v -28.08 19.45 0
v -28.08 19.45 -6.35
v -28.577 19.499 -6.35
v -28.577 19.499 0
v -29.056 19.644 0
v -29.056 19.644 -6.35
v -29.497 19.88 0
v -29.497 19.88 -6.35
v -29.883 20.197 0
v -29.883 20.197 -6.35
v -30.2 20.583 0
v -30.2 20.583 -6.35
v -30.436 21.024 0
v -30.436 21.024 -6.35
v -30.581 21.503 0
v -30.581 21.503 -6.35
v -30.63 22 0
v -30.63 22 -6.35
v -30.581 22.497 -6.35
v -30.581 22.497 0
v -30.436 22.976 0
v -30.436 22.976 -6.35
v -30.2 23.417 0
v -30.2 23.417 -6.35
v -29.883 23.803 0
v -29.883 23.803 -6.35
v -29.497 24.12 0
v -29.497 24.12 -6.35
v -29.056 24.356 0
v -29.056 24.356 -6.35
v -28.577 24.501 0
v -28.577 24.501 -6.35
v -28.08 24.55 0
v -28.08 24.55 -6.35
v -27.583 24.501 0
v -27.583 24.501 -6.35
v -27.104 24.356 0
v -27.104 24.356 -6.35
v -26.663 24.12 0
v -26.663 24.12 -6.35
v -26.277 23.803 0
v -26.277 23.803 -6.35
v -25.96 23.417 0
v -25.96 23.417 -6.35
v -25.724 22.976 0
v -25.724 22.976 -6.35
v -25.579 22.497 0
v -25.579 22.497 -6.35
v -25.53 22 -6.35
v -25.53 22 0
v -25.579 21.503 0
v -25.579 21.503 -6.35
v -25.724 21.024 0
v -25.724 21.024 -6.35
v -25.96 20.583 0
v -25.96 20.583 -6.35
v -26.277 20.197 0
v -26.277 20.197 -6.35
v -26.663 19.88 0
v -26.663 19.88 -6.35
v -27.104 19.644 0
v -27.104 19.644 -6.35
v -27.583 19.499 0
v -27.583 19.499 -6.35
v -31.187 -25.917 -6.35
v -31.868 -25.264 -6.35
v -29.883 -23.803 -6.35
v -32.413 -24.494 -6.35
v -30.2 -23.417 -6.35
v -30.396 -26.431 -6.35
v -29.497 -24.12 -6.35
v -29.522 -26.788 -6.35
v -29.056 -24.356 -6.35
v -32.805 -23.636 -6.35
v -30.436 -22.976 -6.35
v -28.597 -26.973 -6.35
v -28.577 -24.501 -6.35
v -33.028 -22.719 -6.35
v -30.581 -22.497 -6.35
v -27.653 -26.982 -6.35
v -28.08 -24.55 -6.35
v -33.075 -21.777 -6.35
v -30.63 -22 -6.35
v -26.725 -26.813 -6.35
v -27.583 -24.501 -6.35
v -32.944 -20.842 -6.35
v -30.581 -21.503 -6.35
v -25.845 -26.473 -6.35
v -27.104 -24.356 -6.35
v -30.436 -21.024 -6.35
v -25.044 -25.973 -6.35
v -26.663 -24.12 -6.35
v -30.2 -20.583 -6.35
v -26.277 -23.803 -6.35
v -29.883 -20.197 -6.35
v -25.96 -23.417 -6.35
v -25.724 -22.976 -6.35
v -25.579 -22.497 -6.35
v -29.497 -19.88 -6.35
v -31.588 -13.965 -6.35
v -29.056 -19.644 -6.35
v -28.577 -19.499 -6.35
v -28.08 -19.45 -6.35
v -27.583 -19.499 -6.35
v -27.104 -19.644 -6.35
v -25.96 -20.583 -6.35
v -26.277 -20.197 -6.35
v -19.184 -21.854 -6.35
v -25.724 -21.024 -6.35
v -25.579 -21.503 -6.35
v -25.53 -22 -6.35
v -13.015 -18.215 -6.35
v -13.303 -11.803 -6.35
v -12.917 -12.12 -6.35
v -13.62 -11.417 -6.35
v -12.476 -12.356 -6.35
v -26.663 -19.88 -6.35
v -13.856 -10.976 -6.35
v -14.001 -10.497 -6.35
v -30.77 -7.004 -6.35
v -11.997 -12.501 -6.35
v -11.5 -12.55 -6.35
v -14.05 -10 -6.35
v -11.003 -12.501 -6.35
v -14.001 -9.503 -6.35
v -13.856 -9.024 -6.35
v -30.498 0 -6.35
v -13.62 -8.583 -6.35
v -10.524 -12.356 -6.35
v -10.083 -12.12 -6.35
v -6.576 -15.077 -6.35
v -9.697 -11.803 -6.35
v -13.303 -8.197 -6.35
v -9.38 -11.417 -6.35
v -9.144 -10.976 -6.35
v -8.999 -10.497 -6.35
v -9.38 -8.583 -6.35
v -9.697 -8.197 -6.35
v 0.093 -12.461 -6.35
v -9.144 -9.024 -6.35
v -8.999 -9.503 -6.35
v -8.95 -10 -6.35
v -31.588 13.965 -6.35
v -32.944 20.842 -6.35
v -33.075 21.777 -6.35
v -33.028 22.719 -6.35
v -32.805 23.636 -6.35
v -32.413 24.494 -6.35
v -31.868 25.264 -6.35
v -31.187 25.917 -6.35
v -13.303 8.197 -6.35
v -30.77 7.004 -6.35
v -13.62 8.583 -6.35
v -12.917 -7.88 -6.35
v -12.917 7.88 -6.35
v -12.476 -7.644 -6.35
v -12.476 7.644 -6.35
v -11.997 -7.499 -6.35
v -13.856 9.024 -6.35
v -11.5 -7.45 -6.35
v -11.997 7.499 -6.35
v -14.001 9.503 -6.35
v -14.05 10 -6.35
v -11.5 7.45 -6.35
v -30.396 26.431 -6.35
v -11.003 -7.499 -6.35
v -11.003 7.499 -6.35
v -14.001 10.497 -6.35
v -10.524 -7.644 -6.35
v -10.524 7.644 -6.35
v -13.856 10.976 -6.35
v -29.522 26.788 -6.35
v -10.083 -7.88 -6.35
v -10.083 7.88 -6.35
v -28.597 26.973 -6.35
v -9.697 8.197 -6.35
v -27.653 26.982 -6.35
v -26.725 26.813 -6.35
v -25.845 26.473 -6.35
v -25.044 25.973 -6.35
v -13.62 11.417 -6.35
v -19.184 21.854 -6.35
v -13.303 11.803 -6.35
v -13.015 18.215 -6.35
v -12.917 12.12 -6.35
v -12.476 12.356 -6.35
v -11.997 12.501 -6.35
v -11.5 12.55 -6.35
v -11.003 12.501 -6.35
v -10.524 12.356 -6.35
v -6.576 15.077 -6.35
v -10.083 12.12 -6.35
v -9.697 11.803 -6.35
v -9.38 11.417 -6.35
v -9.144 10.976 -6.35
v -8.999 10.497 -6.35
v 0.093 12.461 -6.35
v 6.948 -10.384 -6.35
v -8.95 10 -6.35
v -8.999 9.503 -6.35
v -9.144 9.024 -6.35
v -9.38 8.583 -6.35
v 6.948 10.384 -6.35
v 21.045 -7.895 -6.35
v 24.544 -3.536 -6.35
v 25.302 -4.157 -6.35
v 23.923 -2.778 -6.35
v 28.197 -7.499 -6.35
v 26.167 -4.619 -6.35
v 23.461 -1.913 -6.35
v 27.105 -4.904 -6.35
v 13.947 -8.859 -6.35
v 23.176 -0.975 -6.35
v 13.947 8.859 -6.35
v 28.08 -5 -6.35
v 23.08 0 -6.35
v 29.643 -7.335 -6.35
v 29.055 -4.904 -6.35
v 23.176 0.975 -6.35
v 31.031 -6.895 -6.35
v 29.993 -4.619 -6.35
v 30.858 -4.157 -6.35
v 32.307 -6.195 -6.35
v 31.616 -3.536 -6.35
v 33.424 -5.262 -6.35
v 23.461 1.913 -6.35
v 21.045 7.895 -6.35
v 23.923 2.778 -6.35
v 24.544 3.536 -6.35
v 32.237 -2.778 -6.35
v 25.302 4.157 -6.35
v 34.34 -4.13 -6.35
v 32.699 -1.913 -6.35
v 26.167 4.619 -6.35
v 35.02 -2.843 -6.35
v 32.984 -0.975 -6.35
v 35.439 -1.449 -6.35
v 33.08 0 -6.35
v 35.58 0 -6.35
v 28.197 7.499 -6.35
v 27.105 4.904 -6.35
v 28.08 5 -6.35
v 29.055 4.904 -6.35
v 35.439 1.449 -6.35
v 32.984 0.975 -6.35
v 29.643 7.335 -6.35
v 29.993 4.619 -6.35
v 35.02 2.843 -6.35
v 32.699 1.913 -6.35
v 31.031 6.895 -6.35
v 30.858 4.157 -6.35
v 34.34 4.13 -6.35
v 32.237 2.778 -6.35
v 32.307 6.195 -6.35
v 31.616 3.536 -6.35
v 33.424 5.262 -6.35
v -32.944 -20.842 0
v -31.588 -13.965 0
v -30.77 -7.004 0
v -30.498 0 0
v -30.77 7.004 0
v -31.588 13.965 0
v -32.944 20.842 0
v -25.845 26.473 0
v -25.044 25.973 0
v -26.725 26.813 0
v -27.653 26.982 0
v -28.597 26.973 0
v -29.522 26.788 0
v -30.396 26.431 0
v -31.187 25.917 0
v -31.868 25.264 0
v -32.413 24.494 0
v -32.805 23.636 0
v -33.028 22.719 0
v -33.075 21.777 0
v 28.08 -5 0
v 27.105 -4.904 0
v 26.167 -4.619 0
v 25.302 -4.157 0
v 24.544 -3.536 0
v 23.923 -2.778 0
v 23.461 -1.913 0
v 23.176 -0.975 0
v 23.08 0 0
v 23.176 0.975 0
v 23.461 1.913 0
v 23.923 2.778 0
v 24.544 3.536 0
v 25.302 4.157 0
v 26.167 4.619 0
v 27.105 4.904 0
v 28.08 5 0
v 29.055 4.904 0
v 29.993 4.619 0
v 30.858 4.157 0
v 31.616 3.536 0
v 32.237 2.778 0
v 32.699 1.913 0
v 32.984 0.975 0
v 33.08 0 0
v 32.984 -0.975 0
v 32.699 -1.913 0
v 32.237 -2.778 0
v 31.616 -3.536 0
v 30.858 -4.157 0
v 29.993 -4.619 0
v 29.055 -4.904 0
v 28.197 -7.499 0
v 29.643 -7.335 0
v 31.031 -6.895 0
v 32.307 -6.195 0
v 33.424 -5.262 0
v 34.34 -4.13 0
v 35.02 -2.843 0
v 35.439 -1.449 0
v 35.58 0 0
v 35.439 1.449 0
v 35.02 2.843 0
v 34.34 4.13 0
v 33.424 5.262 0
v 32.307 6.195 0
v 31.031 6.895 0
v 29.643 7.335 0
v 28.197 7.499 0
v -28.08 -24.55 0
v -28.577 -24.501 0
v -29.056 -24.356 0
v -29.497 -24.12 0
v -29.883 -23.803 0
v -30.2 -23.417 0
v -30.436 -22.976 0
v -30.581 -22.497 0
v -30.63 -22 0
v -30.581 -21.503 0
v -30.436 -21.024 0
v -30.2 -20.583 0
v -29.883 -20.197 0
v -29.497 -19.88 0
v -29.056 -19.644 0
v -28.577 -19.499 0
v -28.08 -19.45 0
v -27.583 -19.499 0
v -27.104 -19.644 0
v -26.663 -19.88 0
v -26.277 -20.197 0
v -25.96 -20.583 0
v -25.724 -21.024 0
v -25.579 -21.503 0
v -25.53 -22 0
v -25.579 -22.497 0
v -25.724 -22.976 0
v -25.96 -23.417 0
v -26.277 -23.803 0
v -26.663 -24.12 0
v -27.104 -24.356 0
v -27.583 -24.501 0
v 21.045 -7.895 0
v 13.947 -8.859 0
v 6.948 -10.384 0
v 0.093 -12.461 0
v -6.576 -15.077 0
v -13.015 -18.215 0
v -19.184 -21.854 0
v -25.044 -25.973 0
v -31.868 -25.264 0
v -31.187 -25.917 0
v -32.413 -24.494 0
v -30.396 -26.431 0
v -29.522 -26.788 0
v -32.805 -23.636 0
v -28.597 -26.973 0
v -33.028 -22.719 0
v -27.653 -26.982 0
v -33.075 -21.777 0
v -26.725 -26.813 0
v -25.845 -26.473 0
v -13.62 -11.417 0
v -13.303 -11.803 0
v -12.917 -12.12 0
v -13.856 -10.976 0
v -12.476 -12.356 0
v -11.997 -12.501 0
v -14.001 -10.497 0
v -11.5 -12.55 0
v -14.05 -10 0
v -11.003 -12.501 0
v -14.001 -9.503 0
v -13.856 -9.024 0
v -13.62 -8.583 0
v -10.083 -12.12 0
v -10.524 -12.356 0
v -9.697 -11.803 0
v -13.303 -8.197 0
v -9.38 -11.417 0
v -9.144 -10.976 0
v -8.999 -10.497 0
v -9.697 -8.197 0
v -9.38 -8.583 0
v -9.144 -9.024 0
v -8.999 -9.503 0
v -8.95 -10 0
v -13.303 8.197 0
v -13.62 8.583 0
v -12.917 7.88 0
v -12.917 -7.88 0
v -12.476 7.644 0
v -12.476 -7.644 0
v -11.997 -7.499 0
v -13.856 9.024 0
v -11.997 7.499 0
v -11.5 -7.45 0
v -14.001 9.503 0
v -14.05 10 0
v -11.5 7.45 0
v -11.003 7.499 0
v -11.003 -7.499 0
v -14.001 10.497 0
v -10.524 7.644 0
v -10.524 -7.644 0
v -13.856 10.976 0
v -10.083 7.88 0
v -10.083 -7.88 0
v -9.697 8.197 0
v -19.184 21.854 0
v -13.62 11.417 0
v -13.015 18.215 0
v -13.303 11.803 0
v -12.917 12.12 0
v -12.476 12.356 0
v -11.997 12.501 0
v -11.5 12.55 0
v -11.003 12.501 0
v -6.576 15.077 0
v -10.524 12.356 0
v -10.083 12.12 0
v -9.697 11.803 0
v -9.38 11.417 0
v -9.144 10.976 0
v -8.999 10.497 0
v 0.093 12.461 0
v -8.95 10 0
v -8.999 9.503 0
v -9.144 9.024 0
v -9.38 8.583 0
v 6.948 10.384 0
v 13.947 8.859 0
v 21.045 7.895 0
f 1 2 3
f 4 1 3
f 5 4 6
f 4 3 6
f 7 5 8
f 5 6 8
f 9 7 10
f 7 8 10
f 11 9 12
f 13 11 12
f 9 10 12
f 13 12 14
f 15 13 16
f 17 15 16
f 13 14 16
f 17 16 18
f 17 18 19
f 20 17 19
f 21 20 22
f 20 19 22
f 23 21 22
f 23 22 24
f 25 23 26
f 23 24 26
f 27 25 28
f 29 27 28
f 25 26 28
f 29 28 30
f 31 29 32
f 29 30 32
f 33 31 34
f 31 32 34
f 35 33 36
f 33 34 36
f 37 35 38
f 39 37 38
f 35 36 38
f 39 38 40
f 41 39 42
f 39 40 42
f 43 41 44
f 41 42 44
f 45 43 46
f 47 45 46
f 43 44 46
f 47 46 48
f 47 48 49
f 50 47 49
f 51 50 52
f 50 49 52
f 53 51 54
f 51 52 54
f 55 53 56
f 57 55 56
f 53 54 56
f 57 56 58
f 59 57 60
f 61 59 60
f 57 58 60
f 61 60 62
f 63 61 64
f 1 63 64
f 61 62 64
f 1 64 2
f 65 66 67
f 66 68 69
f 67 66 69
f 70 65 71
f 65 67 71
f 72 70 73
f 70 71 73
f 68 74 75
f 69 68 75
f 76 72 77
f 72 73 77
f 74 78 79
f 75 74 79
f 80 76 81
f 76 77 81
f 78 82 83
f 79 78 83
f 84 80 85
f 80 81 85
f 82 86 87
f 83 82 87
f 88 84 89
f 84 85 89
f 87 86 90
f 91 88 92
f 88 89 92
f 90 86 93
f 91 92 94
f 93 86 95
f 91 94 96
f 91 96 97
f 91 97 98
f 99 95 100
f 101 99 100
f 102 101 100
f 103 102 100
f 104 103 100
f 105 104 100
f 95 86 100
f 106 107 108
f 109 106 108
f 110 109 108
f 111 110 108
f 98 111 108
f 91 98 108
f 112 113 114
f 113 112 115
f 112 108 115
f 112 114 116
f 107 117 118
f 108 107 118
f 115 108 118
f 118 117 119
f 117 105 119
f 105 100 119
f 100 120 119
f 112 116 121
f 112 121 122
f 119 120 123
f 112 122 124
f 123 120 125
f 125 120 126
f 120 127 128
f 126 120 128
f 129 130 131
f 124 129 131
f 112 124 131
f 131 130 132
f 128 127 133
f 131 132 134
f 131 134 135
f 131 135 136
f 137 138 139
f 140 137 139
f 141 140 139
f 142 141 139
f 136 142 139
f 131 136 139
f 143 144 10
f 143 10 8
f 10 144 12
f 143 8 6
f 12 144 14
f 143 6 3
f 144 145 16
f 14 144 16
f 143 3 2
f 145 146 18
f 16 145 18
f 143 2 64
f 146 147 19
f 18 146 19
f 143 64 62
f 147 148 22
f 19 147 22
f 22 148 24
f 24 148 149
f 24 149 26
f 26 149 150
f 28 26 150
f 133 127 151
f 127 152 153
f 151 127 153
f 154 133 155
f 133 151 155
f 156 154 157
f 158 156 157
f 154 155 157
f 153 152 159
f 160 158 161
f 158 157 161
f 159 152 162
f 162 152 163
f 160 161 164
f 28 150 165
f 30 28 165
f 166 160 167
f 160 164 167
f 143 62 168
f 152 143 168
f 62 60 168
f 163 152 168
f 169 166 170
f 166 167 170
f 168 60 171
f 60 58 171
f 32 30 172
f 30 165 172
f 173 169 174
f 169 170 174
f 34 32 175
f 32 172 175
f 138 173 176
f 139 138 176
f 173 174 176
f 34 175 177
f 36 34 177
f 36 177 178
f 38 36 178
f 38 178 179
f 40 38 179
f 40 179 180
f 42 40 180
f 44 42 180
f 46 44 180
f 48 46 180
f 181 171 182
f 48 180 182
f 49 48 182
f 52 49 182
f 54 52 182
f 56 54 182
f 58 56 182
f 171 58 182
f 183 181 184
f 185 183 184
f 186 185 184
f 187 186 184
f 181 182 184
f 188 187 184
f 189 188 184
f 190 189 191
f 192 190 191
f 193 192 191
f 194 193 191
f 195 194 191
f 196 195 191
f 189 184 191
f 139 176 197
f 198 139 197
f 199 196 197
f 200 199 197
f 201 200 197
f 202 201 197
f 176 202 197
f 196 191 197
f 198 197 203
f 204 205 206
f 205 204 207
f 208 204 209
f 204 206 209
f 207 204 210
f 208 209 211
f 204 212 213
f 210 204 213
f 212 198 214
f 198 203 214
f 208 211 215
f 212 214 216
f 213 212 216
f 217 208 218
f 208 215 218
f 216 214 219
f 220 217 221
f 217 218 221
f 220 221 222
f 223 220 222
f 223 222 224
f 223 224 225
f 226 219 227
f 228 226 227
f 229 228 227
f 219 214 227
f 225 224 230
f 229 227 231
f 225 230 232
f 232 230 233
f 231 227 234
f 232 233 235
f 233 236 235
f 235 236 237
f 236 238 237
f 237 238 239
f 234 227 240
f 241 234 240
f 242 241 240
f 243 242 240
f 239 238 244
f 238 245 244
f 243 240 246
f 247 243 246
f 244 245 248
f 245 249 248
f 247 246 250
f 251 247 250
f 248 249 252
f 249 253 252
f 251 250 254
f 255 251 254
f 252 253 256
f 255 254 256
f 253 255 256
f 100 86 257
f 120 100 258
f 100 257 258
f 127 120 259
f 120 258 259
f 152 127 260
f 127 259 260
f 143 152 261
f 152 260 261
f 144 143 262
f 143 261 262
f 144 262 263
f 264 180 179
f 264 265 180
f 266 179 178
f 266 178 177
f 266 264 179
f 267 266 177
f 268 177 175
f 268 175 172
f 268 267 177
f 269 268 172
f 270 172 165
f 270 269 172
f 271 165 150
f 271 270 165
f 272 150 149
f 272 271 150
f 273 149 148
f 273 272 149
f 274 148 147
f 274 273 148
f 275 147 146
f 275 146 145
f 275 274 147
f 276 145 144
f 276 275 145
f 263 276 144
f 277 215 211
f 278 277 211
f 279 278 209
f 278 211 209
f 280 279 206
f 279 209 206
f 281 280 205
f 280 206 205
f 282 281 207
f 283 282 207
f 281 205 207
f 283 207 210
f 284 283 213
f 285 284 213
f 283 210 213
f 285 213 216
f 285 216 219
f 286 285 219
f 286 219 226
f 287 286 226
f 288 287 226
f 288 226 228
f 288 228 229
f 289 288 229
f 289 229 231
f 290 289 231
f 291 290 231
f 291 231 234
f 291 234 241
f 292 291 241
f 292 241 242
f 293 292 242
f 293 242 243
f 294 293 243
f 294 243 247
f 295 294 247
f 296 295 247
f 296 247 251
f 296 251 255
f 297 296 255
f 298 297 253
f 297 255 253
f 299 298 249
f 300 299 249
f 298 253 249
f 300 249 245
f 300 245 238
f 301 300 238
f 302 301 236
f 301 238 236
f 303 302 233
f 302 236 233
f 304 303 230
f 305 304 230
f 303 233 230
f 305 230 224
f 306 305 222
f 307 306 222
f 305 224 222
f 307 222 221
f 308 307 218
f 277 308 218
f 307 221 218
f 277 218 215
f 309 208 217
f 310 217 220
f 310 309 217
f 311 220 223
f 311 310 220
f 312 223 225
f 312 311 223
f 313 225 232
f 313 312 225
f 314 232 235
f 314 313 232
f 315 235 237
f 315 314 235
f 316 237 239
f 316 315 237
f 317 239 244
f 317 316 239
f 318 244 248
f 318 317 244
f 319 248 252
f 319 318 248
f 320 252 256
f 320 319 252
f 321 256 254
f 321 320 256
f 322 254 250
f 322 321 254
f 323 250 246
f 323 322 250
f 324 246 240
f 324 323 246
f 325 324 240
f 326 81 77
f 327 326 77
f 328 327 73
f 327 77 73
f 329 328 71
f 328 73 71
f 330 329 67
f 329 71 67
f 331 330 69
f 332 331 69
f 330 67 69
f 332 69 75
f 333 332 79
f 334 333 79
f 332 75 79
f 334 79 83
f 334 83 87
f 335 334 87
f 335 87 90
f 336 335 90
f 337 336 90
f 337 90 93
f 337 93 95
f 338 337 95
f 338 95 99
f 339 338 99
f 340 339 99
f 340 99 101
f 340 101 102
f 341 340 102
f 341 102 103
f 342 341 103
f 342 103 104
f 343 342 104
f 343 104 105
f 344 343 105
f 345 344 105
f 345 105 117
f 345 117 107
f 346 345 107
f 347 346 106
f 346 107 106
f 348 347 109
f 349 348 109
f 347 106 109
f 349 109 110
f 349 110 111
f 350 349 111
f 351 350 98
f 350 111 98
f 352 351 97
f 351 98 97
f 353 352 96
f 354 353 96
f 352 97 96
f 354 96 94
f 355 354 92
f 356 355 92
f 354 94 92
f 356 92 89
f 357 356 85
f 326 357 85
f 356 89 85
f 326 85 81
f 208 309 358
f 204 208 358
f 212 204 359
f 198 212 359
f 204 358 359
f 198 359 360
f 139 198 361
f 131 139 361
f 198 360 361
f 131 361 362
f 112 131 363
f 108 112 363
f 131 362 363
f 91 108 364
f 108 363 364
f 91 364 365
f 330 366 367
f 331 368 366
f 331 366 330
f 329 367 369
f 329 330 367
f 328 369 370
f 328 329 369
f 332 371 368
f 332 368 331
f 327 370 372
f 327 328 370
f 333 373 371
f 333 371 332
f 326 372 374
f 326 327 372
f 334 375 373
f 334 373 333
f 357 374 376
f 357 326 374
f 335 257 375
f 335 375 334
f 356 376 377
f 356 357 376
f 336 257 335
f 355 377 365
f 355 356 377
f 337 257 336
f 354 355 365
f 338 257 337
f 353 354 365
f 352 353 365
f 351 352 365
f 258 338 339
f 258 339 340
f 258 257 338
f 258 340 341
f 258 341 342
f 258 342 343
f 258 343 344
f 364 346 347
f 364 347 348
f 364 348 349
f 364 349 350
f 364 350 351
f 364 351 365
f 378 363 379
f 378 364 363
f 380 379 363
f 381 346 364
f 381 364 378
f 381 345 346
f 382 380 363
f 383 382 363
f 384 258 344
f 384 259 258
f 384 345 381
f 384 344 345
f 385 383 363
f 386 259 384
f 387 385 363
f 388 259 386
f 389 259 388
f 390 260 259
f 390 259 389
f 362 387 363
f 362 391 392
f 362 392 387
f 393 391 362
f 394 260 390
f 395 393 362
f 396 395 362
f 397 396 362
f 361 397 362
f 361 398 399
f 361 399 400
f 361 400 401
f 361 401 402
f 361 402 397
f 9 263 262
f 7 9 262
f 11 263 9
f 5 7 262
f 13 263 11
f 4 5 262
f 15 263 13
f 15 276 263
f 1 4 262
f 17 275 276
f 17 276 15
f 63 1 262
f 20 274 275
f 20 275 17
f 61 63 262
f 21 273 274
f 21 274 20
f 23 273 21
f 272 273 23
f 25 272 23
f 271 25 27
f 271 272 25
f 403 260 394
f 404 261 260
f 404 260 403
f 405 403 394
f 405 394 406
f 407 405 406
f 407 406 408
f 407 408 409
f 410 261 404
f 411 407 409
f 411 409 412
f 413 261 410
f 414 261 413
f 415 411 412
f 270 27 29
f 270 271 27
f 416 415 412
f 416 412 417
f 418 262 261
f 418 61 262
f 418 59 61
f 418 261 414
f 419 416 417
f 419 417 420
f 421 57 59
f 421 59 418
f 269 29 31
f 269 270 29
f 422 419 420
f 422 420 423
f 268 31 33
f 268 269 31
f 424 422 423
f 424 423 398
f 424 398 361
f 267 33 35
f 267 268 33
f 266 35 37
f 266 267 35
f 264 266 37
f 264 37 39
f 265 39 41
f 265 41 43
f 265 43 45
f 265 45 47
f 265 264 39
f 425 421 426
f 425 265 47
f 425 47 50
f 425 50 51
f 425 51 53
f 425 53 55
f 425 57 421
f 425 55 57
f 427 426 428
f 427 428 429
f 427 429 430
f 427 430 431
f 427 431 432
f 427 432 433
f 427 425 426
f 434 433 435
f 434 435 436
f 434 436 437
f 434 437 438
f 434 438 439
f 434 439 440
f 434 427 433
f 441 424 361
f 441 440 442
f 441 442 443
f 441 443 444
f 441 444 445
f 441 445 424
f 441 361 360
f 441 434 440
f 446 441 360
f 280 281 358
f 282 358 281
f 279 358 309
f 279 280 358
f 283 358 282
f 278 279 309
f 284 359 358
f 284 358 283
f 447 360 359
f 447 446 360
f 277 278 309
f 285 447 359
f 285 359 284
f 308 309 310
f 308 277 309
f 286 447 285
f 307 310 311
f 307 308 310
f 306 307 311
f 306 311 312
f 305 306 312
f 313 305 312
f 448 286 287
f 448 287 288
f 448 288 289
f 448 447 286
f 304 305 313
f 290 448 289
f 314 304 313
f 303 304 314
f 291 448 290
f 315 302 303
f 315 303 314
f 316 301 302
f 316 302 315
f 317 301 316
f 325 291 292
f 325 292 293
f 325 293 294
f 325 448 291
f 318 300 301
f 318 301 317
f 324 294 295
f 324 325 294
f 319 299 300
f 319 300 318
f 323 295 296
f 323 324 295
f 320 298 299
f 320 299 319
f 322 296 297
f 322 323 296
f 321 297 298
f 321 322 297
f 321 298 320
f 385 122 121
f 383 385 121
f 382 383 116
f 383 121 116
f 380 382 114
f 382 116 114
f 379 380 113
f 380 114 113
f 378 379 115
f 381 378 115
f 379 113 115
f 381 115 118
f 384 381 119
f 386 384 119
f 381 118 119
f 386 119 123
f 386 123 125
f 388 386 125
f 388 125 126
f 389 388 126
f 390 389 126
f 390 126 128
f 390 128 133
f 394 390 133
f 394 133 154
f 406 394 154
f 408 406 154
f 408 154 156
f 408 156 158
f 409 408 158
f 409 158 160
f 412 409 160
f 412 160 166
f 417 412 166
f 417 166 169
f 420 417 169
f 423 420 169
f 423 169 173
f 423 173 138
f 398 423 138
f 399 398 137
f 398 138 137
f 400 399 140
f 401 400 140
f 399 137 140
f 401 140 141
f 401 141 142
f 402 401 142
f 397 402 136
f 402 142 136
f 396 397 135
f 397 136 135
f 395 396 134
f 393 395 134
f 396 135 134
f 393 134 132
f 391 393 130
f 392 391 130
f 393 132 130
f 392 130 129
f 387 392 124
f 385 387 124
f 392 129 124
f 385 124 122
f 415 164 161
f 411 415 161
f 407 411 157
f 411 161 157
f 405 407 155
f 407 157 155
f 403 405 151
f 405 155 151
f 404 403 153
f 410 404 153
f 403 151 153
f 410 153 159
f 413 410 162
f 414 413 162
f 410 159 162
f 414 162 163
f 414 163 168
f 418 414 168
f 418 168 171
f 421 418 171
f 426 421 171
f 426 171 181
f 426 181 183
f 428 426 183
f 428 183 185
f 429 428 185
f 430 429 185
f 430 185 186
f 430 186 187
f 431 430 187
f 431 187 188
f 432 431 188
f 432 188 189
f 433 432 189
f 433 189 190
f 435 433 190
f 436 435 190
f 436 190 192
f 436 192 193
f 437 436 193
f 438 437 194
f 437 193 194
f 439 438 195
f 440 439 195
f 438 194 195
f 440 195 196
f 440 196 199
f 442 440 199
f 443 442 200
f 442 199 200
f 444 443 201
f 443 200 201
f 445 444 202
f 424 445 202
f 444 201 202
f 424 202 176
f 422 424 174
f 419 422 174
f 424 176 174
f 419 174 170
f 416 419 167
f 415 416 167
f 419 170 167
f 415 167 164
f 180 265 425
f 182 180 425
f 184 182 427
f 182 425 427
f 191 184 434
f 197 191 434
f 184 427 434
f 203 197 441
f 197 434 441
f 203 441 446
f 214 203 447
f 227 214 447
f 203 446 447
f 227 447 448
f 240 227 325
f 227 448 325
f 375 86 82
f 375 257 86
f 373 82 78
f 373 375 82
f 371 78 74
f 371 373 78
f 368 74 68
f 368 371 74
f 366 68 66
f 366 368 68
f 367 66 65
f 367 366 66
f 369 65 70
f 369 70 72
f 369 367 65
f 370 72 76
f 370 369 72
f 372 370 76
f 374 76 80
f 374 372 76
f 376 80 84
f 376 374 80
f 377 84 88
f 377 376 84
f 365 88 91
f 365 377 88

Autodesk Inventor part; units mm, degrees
ref_plane "XY Plane" through (0, 0, 0) normal (0, 0, 1) x (1, 0, 0)
sketch "Sketch1" plane through (0, 0, 0) normal (0, 0, 1) x (1, 0, 0)
  line L0 (-20, 150) -> (20, 150) construction
  line L1 (20, 150) -> (20, -150) construction
  line L2 (20, -150) -> (-20, -150) construction
  line L3 (-20, -150) -> (-20, 150) construction
  circle A0 centre (-28.08, 22) radius 10.72 construction
  circle A1 centre (-28.08, -22) radius 10.72 construction
  circle A2 centre (28.08, 0) radius 10.72 construction
  line L4 (38.8, 14.9853) -> (38.8, -13.1126) construction
  circle A3 centre (28.08, 0) radius 7.5
  circle A4 centre (-28.08, 22) radius 5
  circle A5 centre (-28.08, -22) radius 5
  arc A6 (-32.9441, -20.8421) -> (-32.9441, 20.8421) centre (-120.4975, 0) ccw
  arc A7 (-25.0444, 25.9731) -> (28.1966, 7.4991) centre (29.5961, 97.4882) ccw
  arc A8 (28.1966, -7.4991) -> (-25.0444, -25.9731) centre (29.5961, -97.4882) ccw
  line L5 (-30.4975, 3.8118) -> (-30.4975, -3.8118) construction
  line L6 (0, 150) -> (0, -150) construction
  line L7 (-62, -108) -> (-20, -108) construction
  line L8 (-20, -108) -> (-20, -150) construction
  line L9 (-20, -150) -> (-62, -150) construction
  line L10 (-62, -150) -> (-62, -108) construction
  line L11 (-62, 150) -> (-20, 150) construction
  line L12 (-20, 150) -> (-20, 108) construction
  line L13 (-20, 108) -> (-62, 108) construction
  line L14 (-62, 108) -> (-62, 150) construction
  circle A9 centre (-41, -129) radius 6 construction
  line L15 (-70.4975, 7.5) -> (-30.4975, 7.5)
  line L16 (-30.4975, 7.5) -> (-30.4975, -7.5)
  line L17 (-30.4975, -7.5) -> (-70.4975, -7.5)
  line L18 (-70.4975, -7.5) -> (-70.4975, 7.5)
  point P0 (0, 0)
  point P1 (20, 0)
  point P2 (-29.8, 0)
  point P3 (-20, 0)
  point P4 (-62, -129)
  point P5 (-41, -108)
  point P6 (-30.4975, 0)
  point P7 (-62.9975, 0)
  point P8 (-37.9975, 0)
  point P9 (-70.4975, 0)
  point P10 (-30.8106, -7.5)
  point P11 (-30.8106, 7.5)
  point P12 (-11.5, 10)
  point P13 (-11.5, -10)
  dimension "d0" = 40
  dimension "d1" = 300
  dimension "d2" = 21.44
  dimension "d3" = 22
  dimension "d4" = 22
  dimension "d5" = 58.8
  dimension "d6" = 28.08
  dimension "d7" = 28.08
  dimension "d9" = 90
  dimension "d12" = 15
  dimension "d38" = 10
  dimension "d40" = 42
  dimension "d41" = 12
  dimension "d42" = 15
  dimension "d43" = 40
  dimension "d44" = 25
  dimension "d45" = 7.5
  dimension "d46" = 7.5
  dimension "d48" = 90
  dimension "d49" = 16.58
  dimension "d50" = 12
  dimension "d51" = 10
extrude "Extrusion1" add sketch "Sketch1" against normal blind 6.35 contours A3 | A3 A8 A5 A6 L17 L16 L15 A4 A7 | A4 | A5 | L15 L16 A6 | A6 L16 L17
hole "Hole1" at (-28.08, 22, 0) at (-28.08, -22, 0) direction (0, 0, -1) diameter 5.1 end through all
hole "Hole3" at (28.08, 0, 0) direction (0, 0, -1) diameter 10 end through all
ref_plane "Work Plane2" through (-30.4975, 0, 0) normal (1, 0, 0) x (0, 1, 0)
ref_plane "Work Plane3" through (0, 150, 0) normal (-1, 0, 0) x (0, -1, 0)
hole "Hole4" at (-62.9975, 0, 0) at (-37.9975, 0, 0) at (-11.5, 10, 0) at (-11.5, -10, 0) direction (0, 0, -1) diameter 5.1 end through all
equation "\"d4\" = d3"
equation "\"d7\" = d6"
equation "\"d46\" = d45"
properties part number "XZ Plate2"
